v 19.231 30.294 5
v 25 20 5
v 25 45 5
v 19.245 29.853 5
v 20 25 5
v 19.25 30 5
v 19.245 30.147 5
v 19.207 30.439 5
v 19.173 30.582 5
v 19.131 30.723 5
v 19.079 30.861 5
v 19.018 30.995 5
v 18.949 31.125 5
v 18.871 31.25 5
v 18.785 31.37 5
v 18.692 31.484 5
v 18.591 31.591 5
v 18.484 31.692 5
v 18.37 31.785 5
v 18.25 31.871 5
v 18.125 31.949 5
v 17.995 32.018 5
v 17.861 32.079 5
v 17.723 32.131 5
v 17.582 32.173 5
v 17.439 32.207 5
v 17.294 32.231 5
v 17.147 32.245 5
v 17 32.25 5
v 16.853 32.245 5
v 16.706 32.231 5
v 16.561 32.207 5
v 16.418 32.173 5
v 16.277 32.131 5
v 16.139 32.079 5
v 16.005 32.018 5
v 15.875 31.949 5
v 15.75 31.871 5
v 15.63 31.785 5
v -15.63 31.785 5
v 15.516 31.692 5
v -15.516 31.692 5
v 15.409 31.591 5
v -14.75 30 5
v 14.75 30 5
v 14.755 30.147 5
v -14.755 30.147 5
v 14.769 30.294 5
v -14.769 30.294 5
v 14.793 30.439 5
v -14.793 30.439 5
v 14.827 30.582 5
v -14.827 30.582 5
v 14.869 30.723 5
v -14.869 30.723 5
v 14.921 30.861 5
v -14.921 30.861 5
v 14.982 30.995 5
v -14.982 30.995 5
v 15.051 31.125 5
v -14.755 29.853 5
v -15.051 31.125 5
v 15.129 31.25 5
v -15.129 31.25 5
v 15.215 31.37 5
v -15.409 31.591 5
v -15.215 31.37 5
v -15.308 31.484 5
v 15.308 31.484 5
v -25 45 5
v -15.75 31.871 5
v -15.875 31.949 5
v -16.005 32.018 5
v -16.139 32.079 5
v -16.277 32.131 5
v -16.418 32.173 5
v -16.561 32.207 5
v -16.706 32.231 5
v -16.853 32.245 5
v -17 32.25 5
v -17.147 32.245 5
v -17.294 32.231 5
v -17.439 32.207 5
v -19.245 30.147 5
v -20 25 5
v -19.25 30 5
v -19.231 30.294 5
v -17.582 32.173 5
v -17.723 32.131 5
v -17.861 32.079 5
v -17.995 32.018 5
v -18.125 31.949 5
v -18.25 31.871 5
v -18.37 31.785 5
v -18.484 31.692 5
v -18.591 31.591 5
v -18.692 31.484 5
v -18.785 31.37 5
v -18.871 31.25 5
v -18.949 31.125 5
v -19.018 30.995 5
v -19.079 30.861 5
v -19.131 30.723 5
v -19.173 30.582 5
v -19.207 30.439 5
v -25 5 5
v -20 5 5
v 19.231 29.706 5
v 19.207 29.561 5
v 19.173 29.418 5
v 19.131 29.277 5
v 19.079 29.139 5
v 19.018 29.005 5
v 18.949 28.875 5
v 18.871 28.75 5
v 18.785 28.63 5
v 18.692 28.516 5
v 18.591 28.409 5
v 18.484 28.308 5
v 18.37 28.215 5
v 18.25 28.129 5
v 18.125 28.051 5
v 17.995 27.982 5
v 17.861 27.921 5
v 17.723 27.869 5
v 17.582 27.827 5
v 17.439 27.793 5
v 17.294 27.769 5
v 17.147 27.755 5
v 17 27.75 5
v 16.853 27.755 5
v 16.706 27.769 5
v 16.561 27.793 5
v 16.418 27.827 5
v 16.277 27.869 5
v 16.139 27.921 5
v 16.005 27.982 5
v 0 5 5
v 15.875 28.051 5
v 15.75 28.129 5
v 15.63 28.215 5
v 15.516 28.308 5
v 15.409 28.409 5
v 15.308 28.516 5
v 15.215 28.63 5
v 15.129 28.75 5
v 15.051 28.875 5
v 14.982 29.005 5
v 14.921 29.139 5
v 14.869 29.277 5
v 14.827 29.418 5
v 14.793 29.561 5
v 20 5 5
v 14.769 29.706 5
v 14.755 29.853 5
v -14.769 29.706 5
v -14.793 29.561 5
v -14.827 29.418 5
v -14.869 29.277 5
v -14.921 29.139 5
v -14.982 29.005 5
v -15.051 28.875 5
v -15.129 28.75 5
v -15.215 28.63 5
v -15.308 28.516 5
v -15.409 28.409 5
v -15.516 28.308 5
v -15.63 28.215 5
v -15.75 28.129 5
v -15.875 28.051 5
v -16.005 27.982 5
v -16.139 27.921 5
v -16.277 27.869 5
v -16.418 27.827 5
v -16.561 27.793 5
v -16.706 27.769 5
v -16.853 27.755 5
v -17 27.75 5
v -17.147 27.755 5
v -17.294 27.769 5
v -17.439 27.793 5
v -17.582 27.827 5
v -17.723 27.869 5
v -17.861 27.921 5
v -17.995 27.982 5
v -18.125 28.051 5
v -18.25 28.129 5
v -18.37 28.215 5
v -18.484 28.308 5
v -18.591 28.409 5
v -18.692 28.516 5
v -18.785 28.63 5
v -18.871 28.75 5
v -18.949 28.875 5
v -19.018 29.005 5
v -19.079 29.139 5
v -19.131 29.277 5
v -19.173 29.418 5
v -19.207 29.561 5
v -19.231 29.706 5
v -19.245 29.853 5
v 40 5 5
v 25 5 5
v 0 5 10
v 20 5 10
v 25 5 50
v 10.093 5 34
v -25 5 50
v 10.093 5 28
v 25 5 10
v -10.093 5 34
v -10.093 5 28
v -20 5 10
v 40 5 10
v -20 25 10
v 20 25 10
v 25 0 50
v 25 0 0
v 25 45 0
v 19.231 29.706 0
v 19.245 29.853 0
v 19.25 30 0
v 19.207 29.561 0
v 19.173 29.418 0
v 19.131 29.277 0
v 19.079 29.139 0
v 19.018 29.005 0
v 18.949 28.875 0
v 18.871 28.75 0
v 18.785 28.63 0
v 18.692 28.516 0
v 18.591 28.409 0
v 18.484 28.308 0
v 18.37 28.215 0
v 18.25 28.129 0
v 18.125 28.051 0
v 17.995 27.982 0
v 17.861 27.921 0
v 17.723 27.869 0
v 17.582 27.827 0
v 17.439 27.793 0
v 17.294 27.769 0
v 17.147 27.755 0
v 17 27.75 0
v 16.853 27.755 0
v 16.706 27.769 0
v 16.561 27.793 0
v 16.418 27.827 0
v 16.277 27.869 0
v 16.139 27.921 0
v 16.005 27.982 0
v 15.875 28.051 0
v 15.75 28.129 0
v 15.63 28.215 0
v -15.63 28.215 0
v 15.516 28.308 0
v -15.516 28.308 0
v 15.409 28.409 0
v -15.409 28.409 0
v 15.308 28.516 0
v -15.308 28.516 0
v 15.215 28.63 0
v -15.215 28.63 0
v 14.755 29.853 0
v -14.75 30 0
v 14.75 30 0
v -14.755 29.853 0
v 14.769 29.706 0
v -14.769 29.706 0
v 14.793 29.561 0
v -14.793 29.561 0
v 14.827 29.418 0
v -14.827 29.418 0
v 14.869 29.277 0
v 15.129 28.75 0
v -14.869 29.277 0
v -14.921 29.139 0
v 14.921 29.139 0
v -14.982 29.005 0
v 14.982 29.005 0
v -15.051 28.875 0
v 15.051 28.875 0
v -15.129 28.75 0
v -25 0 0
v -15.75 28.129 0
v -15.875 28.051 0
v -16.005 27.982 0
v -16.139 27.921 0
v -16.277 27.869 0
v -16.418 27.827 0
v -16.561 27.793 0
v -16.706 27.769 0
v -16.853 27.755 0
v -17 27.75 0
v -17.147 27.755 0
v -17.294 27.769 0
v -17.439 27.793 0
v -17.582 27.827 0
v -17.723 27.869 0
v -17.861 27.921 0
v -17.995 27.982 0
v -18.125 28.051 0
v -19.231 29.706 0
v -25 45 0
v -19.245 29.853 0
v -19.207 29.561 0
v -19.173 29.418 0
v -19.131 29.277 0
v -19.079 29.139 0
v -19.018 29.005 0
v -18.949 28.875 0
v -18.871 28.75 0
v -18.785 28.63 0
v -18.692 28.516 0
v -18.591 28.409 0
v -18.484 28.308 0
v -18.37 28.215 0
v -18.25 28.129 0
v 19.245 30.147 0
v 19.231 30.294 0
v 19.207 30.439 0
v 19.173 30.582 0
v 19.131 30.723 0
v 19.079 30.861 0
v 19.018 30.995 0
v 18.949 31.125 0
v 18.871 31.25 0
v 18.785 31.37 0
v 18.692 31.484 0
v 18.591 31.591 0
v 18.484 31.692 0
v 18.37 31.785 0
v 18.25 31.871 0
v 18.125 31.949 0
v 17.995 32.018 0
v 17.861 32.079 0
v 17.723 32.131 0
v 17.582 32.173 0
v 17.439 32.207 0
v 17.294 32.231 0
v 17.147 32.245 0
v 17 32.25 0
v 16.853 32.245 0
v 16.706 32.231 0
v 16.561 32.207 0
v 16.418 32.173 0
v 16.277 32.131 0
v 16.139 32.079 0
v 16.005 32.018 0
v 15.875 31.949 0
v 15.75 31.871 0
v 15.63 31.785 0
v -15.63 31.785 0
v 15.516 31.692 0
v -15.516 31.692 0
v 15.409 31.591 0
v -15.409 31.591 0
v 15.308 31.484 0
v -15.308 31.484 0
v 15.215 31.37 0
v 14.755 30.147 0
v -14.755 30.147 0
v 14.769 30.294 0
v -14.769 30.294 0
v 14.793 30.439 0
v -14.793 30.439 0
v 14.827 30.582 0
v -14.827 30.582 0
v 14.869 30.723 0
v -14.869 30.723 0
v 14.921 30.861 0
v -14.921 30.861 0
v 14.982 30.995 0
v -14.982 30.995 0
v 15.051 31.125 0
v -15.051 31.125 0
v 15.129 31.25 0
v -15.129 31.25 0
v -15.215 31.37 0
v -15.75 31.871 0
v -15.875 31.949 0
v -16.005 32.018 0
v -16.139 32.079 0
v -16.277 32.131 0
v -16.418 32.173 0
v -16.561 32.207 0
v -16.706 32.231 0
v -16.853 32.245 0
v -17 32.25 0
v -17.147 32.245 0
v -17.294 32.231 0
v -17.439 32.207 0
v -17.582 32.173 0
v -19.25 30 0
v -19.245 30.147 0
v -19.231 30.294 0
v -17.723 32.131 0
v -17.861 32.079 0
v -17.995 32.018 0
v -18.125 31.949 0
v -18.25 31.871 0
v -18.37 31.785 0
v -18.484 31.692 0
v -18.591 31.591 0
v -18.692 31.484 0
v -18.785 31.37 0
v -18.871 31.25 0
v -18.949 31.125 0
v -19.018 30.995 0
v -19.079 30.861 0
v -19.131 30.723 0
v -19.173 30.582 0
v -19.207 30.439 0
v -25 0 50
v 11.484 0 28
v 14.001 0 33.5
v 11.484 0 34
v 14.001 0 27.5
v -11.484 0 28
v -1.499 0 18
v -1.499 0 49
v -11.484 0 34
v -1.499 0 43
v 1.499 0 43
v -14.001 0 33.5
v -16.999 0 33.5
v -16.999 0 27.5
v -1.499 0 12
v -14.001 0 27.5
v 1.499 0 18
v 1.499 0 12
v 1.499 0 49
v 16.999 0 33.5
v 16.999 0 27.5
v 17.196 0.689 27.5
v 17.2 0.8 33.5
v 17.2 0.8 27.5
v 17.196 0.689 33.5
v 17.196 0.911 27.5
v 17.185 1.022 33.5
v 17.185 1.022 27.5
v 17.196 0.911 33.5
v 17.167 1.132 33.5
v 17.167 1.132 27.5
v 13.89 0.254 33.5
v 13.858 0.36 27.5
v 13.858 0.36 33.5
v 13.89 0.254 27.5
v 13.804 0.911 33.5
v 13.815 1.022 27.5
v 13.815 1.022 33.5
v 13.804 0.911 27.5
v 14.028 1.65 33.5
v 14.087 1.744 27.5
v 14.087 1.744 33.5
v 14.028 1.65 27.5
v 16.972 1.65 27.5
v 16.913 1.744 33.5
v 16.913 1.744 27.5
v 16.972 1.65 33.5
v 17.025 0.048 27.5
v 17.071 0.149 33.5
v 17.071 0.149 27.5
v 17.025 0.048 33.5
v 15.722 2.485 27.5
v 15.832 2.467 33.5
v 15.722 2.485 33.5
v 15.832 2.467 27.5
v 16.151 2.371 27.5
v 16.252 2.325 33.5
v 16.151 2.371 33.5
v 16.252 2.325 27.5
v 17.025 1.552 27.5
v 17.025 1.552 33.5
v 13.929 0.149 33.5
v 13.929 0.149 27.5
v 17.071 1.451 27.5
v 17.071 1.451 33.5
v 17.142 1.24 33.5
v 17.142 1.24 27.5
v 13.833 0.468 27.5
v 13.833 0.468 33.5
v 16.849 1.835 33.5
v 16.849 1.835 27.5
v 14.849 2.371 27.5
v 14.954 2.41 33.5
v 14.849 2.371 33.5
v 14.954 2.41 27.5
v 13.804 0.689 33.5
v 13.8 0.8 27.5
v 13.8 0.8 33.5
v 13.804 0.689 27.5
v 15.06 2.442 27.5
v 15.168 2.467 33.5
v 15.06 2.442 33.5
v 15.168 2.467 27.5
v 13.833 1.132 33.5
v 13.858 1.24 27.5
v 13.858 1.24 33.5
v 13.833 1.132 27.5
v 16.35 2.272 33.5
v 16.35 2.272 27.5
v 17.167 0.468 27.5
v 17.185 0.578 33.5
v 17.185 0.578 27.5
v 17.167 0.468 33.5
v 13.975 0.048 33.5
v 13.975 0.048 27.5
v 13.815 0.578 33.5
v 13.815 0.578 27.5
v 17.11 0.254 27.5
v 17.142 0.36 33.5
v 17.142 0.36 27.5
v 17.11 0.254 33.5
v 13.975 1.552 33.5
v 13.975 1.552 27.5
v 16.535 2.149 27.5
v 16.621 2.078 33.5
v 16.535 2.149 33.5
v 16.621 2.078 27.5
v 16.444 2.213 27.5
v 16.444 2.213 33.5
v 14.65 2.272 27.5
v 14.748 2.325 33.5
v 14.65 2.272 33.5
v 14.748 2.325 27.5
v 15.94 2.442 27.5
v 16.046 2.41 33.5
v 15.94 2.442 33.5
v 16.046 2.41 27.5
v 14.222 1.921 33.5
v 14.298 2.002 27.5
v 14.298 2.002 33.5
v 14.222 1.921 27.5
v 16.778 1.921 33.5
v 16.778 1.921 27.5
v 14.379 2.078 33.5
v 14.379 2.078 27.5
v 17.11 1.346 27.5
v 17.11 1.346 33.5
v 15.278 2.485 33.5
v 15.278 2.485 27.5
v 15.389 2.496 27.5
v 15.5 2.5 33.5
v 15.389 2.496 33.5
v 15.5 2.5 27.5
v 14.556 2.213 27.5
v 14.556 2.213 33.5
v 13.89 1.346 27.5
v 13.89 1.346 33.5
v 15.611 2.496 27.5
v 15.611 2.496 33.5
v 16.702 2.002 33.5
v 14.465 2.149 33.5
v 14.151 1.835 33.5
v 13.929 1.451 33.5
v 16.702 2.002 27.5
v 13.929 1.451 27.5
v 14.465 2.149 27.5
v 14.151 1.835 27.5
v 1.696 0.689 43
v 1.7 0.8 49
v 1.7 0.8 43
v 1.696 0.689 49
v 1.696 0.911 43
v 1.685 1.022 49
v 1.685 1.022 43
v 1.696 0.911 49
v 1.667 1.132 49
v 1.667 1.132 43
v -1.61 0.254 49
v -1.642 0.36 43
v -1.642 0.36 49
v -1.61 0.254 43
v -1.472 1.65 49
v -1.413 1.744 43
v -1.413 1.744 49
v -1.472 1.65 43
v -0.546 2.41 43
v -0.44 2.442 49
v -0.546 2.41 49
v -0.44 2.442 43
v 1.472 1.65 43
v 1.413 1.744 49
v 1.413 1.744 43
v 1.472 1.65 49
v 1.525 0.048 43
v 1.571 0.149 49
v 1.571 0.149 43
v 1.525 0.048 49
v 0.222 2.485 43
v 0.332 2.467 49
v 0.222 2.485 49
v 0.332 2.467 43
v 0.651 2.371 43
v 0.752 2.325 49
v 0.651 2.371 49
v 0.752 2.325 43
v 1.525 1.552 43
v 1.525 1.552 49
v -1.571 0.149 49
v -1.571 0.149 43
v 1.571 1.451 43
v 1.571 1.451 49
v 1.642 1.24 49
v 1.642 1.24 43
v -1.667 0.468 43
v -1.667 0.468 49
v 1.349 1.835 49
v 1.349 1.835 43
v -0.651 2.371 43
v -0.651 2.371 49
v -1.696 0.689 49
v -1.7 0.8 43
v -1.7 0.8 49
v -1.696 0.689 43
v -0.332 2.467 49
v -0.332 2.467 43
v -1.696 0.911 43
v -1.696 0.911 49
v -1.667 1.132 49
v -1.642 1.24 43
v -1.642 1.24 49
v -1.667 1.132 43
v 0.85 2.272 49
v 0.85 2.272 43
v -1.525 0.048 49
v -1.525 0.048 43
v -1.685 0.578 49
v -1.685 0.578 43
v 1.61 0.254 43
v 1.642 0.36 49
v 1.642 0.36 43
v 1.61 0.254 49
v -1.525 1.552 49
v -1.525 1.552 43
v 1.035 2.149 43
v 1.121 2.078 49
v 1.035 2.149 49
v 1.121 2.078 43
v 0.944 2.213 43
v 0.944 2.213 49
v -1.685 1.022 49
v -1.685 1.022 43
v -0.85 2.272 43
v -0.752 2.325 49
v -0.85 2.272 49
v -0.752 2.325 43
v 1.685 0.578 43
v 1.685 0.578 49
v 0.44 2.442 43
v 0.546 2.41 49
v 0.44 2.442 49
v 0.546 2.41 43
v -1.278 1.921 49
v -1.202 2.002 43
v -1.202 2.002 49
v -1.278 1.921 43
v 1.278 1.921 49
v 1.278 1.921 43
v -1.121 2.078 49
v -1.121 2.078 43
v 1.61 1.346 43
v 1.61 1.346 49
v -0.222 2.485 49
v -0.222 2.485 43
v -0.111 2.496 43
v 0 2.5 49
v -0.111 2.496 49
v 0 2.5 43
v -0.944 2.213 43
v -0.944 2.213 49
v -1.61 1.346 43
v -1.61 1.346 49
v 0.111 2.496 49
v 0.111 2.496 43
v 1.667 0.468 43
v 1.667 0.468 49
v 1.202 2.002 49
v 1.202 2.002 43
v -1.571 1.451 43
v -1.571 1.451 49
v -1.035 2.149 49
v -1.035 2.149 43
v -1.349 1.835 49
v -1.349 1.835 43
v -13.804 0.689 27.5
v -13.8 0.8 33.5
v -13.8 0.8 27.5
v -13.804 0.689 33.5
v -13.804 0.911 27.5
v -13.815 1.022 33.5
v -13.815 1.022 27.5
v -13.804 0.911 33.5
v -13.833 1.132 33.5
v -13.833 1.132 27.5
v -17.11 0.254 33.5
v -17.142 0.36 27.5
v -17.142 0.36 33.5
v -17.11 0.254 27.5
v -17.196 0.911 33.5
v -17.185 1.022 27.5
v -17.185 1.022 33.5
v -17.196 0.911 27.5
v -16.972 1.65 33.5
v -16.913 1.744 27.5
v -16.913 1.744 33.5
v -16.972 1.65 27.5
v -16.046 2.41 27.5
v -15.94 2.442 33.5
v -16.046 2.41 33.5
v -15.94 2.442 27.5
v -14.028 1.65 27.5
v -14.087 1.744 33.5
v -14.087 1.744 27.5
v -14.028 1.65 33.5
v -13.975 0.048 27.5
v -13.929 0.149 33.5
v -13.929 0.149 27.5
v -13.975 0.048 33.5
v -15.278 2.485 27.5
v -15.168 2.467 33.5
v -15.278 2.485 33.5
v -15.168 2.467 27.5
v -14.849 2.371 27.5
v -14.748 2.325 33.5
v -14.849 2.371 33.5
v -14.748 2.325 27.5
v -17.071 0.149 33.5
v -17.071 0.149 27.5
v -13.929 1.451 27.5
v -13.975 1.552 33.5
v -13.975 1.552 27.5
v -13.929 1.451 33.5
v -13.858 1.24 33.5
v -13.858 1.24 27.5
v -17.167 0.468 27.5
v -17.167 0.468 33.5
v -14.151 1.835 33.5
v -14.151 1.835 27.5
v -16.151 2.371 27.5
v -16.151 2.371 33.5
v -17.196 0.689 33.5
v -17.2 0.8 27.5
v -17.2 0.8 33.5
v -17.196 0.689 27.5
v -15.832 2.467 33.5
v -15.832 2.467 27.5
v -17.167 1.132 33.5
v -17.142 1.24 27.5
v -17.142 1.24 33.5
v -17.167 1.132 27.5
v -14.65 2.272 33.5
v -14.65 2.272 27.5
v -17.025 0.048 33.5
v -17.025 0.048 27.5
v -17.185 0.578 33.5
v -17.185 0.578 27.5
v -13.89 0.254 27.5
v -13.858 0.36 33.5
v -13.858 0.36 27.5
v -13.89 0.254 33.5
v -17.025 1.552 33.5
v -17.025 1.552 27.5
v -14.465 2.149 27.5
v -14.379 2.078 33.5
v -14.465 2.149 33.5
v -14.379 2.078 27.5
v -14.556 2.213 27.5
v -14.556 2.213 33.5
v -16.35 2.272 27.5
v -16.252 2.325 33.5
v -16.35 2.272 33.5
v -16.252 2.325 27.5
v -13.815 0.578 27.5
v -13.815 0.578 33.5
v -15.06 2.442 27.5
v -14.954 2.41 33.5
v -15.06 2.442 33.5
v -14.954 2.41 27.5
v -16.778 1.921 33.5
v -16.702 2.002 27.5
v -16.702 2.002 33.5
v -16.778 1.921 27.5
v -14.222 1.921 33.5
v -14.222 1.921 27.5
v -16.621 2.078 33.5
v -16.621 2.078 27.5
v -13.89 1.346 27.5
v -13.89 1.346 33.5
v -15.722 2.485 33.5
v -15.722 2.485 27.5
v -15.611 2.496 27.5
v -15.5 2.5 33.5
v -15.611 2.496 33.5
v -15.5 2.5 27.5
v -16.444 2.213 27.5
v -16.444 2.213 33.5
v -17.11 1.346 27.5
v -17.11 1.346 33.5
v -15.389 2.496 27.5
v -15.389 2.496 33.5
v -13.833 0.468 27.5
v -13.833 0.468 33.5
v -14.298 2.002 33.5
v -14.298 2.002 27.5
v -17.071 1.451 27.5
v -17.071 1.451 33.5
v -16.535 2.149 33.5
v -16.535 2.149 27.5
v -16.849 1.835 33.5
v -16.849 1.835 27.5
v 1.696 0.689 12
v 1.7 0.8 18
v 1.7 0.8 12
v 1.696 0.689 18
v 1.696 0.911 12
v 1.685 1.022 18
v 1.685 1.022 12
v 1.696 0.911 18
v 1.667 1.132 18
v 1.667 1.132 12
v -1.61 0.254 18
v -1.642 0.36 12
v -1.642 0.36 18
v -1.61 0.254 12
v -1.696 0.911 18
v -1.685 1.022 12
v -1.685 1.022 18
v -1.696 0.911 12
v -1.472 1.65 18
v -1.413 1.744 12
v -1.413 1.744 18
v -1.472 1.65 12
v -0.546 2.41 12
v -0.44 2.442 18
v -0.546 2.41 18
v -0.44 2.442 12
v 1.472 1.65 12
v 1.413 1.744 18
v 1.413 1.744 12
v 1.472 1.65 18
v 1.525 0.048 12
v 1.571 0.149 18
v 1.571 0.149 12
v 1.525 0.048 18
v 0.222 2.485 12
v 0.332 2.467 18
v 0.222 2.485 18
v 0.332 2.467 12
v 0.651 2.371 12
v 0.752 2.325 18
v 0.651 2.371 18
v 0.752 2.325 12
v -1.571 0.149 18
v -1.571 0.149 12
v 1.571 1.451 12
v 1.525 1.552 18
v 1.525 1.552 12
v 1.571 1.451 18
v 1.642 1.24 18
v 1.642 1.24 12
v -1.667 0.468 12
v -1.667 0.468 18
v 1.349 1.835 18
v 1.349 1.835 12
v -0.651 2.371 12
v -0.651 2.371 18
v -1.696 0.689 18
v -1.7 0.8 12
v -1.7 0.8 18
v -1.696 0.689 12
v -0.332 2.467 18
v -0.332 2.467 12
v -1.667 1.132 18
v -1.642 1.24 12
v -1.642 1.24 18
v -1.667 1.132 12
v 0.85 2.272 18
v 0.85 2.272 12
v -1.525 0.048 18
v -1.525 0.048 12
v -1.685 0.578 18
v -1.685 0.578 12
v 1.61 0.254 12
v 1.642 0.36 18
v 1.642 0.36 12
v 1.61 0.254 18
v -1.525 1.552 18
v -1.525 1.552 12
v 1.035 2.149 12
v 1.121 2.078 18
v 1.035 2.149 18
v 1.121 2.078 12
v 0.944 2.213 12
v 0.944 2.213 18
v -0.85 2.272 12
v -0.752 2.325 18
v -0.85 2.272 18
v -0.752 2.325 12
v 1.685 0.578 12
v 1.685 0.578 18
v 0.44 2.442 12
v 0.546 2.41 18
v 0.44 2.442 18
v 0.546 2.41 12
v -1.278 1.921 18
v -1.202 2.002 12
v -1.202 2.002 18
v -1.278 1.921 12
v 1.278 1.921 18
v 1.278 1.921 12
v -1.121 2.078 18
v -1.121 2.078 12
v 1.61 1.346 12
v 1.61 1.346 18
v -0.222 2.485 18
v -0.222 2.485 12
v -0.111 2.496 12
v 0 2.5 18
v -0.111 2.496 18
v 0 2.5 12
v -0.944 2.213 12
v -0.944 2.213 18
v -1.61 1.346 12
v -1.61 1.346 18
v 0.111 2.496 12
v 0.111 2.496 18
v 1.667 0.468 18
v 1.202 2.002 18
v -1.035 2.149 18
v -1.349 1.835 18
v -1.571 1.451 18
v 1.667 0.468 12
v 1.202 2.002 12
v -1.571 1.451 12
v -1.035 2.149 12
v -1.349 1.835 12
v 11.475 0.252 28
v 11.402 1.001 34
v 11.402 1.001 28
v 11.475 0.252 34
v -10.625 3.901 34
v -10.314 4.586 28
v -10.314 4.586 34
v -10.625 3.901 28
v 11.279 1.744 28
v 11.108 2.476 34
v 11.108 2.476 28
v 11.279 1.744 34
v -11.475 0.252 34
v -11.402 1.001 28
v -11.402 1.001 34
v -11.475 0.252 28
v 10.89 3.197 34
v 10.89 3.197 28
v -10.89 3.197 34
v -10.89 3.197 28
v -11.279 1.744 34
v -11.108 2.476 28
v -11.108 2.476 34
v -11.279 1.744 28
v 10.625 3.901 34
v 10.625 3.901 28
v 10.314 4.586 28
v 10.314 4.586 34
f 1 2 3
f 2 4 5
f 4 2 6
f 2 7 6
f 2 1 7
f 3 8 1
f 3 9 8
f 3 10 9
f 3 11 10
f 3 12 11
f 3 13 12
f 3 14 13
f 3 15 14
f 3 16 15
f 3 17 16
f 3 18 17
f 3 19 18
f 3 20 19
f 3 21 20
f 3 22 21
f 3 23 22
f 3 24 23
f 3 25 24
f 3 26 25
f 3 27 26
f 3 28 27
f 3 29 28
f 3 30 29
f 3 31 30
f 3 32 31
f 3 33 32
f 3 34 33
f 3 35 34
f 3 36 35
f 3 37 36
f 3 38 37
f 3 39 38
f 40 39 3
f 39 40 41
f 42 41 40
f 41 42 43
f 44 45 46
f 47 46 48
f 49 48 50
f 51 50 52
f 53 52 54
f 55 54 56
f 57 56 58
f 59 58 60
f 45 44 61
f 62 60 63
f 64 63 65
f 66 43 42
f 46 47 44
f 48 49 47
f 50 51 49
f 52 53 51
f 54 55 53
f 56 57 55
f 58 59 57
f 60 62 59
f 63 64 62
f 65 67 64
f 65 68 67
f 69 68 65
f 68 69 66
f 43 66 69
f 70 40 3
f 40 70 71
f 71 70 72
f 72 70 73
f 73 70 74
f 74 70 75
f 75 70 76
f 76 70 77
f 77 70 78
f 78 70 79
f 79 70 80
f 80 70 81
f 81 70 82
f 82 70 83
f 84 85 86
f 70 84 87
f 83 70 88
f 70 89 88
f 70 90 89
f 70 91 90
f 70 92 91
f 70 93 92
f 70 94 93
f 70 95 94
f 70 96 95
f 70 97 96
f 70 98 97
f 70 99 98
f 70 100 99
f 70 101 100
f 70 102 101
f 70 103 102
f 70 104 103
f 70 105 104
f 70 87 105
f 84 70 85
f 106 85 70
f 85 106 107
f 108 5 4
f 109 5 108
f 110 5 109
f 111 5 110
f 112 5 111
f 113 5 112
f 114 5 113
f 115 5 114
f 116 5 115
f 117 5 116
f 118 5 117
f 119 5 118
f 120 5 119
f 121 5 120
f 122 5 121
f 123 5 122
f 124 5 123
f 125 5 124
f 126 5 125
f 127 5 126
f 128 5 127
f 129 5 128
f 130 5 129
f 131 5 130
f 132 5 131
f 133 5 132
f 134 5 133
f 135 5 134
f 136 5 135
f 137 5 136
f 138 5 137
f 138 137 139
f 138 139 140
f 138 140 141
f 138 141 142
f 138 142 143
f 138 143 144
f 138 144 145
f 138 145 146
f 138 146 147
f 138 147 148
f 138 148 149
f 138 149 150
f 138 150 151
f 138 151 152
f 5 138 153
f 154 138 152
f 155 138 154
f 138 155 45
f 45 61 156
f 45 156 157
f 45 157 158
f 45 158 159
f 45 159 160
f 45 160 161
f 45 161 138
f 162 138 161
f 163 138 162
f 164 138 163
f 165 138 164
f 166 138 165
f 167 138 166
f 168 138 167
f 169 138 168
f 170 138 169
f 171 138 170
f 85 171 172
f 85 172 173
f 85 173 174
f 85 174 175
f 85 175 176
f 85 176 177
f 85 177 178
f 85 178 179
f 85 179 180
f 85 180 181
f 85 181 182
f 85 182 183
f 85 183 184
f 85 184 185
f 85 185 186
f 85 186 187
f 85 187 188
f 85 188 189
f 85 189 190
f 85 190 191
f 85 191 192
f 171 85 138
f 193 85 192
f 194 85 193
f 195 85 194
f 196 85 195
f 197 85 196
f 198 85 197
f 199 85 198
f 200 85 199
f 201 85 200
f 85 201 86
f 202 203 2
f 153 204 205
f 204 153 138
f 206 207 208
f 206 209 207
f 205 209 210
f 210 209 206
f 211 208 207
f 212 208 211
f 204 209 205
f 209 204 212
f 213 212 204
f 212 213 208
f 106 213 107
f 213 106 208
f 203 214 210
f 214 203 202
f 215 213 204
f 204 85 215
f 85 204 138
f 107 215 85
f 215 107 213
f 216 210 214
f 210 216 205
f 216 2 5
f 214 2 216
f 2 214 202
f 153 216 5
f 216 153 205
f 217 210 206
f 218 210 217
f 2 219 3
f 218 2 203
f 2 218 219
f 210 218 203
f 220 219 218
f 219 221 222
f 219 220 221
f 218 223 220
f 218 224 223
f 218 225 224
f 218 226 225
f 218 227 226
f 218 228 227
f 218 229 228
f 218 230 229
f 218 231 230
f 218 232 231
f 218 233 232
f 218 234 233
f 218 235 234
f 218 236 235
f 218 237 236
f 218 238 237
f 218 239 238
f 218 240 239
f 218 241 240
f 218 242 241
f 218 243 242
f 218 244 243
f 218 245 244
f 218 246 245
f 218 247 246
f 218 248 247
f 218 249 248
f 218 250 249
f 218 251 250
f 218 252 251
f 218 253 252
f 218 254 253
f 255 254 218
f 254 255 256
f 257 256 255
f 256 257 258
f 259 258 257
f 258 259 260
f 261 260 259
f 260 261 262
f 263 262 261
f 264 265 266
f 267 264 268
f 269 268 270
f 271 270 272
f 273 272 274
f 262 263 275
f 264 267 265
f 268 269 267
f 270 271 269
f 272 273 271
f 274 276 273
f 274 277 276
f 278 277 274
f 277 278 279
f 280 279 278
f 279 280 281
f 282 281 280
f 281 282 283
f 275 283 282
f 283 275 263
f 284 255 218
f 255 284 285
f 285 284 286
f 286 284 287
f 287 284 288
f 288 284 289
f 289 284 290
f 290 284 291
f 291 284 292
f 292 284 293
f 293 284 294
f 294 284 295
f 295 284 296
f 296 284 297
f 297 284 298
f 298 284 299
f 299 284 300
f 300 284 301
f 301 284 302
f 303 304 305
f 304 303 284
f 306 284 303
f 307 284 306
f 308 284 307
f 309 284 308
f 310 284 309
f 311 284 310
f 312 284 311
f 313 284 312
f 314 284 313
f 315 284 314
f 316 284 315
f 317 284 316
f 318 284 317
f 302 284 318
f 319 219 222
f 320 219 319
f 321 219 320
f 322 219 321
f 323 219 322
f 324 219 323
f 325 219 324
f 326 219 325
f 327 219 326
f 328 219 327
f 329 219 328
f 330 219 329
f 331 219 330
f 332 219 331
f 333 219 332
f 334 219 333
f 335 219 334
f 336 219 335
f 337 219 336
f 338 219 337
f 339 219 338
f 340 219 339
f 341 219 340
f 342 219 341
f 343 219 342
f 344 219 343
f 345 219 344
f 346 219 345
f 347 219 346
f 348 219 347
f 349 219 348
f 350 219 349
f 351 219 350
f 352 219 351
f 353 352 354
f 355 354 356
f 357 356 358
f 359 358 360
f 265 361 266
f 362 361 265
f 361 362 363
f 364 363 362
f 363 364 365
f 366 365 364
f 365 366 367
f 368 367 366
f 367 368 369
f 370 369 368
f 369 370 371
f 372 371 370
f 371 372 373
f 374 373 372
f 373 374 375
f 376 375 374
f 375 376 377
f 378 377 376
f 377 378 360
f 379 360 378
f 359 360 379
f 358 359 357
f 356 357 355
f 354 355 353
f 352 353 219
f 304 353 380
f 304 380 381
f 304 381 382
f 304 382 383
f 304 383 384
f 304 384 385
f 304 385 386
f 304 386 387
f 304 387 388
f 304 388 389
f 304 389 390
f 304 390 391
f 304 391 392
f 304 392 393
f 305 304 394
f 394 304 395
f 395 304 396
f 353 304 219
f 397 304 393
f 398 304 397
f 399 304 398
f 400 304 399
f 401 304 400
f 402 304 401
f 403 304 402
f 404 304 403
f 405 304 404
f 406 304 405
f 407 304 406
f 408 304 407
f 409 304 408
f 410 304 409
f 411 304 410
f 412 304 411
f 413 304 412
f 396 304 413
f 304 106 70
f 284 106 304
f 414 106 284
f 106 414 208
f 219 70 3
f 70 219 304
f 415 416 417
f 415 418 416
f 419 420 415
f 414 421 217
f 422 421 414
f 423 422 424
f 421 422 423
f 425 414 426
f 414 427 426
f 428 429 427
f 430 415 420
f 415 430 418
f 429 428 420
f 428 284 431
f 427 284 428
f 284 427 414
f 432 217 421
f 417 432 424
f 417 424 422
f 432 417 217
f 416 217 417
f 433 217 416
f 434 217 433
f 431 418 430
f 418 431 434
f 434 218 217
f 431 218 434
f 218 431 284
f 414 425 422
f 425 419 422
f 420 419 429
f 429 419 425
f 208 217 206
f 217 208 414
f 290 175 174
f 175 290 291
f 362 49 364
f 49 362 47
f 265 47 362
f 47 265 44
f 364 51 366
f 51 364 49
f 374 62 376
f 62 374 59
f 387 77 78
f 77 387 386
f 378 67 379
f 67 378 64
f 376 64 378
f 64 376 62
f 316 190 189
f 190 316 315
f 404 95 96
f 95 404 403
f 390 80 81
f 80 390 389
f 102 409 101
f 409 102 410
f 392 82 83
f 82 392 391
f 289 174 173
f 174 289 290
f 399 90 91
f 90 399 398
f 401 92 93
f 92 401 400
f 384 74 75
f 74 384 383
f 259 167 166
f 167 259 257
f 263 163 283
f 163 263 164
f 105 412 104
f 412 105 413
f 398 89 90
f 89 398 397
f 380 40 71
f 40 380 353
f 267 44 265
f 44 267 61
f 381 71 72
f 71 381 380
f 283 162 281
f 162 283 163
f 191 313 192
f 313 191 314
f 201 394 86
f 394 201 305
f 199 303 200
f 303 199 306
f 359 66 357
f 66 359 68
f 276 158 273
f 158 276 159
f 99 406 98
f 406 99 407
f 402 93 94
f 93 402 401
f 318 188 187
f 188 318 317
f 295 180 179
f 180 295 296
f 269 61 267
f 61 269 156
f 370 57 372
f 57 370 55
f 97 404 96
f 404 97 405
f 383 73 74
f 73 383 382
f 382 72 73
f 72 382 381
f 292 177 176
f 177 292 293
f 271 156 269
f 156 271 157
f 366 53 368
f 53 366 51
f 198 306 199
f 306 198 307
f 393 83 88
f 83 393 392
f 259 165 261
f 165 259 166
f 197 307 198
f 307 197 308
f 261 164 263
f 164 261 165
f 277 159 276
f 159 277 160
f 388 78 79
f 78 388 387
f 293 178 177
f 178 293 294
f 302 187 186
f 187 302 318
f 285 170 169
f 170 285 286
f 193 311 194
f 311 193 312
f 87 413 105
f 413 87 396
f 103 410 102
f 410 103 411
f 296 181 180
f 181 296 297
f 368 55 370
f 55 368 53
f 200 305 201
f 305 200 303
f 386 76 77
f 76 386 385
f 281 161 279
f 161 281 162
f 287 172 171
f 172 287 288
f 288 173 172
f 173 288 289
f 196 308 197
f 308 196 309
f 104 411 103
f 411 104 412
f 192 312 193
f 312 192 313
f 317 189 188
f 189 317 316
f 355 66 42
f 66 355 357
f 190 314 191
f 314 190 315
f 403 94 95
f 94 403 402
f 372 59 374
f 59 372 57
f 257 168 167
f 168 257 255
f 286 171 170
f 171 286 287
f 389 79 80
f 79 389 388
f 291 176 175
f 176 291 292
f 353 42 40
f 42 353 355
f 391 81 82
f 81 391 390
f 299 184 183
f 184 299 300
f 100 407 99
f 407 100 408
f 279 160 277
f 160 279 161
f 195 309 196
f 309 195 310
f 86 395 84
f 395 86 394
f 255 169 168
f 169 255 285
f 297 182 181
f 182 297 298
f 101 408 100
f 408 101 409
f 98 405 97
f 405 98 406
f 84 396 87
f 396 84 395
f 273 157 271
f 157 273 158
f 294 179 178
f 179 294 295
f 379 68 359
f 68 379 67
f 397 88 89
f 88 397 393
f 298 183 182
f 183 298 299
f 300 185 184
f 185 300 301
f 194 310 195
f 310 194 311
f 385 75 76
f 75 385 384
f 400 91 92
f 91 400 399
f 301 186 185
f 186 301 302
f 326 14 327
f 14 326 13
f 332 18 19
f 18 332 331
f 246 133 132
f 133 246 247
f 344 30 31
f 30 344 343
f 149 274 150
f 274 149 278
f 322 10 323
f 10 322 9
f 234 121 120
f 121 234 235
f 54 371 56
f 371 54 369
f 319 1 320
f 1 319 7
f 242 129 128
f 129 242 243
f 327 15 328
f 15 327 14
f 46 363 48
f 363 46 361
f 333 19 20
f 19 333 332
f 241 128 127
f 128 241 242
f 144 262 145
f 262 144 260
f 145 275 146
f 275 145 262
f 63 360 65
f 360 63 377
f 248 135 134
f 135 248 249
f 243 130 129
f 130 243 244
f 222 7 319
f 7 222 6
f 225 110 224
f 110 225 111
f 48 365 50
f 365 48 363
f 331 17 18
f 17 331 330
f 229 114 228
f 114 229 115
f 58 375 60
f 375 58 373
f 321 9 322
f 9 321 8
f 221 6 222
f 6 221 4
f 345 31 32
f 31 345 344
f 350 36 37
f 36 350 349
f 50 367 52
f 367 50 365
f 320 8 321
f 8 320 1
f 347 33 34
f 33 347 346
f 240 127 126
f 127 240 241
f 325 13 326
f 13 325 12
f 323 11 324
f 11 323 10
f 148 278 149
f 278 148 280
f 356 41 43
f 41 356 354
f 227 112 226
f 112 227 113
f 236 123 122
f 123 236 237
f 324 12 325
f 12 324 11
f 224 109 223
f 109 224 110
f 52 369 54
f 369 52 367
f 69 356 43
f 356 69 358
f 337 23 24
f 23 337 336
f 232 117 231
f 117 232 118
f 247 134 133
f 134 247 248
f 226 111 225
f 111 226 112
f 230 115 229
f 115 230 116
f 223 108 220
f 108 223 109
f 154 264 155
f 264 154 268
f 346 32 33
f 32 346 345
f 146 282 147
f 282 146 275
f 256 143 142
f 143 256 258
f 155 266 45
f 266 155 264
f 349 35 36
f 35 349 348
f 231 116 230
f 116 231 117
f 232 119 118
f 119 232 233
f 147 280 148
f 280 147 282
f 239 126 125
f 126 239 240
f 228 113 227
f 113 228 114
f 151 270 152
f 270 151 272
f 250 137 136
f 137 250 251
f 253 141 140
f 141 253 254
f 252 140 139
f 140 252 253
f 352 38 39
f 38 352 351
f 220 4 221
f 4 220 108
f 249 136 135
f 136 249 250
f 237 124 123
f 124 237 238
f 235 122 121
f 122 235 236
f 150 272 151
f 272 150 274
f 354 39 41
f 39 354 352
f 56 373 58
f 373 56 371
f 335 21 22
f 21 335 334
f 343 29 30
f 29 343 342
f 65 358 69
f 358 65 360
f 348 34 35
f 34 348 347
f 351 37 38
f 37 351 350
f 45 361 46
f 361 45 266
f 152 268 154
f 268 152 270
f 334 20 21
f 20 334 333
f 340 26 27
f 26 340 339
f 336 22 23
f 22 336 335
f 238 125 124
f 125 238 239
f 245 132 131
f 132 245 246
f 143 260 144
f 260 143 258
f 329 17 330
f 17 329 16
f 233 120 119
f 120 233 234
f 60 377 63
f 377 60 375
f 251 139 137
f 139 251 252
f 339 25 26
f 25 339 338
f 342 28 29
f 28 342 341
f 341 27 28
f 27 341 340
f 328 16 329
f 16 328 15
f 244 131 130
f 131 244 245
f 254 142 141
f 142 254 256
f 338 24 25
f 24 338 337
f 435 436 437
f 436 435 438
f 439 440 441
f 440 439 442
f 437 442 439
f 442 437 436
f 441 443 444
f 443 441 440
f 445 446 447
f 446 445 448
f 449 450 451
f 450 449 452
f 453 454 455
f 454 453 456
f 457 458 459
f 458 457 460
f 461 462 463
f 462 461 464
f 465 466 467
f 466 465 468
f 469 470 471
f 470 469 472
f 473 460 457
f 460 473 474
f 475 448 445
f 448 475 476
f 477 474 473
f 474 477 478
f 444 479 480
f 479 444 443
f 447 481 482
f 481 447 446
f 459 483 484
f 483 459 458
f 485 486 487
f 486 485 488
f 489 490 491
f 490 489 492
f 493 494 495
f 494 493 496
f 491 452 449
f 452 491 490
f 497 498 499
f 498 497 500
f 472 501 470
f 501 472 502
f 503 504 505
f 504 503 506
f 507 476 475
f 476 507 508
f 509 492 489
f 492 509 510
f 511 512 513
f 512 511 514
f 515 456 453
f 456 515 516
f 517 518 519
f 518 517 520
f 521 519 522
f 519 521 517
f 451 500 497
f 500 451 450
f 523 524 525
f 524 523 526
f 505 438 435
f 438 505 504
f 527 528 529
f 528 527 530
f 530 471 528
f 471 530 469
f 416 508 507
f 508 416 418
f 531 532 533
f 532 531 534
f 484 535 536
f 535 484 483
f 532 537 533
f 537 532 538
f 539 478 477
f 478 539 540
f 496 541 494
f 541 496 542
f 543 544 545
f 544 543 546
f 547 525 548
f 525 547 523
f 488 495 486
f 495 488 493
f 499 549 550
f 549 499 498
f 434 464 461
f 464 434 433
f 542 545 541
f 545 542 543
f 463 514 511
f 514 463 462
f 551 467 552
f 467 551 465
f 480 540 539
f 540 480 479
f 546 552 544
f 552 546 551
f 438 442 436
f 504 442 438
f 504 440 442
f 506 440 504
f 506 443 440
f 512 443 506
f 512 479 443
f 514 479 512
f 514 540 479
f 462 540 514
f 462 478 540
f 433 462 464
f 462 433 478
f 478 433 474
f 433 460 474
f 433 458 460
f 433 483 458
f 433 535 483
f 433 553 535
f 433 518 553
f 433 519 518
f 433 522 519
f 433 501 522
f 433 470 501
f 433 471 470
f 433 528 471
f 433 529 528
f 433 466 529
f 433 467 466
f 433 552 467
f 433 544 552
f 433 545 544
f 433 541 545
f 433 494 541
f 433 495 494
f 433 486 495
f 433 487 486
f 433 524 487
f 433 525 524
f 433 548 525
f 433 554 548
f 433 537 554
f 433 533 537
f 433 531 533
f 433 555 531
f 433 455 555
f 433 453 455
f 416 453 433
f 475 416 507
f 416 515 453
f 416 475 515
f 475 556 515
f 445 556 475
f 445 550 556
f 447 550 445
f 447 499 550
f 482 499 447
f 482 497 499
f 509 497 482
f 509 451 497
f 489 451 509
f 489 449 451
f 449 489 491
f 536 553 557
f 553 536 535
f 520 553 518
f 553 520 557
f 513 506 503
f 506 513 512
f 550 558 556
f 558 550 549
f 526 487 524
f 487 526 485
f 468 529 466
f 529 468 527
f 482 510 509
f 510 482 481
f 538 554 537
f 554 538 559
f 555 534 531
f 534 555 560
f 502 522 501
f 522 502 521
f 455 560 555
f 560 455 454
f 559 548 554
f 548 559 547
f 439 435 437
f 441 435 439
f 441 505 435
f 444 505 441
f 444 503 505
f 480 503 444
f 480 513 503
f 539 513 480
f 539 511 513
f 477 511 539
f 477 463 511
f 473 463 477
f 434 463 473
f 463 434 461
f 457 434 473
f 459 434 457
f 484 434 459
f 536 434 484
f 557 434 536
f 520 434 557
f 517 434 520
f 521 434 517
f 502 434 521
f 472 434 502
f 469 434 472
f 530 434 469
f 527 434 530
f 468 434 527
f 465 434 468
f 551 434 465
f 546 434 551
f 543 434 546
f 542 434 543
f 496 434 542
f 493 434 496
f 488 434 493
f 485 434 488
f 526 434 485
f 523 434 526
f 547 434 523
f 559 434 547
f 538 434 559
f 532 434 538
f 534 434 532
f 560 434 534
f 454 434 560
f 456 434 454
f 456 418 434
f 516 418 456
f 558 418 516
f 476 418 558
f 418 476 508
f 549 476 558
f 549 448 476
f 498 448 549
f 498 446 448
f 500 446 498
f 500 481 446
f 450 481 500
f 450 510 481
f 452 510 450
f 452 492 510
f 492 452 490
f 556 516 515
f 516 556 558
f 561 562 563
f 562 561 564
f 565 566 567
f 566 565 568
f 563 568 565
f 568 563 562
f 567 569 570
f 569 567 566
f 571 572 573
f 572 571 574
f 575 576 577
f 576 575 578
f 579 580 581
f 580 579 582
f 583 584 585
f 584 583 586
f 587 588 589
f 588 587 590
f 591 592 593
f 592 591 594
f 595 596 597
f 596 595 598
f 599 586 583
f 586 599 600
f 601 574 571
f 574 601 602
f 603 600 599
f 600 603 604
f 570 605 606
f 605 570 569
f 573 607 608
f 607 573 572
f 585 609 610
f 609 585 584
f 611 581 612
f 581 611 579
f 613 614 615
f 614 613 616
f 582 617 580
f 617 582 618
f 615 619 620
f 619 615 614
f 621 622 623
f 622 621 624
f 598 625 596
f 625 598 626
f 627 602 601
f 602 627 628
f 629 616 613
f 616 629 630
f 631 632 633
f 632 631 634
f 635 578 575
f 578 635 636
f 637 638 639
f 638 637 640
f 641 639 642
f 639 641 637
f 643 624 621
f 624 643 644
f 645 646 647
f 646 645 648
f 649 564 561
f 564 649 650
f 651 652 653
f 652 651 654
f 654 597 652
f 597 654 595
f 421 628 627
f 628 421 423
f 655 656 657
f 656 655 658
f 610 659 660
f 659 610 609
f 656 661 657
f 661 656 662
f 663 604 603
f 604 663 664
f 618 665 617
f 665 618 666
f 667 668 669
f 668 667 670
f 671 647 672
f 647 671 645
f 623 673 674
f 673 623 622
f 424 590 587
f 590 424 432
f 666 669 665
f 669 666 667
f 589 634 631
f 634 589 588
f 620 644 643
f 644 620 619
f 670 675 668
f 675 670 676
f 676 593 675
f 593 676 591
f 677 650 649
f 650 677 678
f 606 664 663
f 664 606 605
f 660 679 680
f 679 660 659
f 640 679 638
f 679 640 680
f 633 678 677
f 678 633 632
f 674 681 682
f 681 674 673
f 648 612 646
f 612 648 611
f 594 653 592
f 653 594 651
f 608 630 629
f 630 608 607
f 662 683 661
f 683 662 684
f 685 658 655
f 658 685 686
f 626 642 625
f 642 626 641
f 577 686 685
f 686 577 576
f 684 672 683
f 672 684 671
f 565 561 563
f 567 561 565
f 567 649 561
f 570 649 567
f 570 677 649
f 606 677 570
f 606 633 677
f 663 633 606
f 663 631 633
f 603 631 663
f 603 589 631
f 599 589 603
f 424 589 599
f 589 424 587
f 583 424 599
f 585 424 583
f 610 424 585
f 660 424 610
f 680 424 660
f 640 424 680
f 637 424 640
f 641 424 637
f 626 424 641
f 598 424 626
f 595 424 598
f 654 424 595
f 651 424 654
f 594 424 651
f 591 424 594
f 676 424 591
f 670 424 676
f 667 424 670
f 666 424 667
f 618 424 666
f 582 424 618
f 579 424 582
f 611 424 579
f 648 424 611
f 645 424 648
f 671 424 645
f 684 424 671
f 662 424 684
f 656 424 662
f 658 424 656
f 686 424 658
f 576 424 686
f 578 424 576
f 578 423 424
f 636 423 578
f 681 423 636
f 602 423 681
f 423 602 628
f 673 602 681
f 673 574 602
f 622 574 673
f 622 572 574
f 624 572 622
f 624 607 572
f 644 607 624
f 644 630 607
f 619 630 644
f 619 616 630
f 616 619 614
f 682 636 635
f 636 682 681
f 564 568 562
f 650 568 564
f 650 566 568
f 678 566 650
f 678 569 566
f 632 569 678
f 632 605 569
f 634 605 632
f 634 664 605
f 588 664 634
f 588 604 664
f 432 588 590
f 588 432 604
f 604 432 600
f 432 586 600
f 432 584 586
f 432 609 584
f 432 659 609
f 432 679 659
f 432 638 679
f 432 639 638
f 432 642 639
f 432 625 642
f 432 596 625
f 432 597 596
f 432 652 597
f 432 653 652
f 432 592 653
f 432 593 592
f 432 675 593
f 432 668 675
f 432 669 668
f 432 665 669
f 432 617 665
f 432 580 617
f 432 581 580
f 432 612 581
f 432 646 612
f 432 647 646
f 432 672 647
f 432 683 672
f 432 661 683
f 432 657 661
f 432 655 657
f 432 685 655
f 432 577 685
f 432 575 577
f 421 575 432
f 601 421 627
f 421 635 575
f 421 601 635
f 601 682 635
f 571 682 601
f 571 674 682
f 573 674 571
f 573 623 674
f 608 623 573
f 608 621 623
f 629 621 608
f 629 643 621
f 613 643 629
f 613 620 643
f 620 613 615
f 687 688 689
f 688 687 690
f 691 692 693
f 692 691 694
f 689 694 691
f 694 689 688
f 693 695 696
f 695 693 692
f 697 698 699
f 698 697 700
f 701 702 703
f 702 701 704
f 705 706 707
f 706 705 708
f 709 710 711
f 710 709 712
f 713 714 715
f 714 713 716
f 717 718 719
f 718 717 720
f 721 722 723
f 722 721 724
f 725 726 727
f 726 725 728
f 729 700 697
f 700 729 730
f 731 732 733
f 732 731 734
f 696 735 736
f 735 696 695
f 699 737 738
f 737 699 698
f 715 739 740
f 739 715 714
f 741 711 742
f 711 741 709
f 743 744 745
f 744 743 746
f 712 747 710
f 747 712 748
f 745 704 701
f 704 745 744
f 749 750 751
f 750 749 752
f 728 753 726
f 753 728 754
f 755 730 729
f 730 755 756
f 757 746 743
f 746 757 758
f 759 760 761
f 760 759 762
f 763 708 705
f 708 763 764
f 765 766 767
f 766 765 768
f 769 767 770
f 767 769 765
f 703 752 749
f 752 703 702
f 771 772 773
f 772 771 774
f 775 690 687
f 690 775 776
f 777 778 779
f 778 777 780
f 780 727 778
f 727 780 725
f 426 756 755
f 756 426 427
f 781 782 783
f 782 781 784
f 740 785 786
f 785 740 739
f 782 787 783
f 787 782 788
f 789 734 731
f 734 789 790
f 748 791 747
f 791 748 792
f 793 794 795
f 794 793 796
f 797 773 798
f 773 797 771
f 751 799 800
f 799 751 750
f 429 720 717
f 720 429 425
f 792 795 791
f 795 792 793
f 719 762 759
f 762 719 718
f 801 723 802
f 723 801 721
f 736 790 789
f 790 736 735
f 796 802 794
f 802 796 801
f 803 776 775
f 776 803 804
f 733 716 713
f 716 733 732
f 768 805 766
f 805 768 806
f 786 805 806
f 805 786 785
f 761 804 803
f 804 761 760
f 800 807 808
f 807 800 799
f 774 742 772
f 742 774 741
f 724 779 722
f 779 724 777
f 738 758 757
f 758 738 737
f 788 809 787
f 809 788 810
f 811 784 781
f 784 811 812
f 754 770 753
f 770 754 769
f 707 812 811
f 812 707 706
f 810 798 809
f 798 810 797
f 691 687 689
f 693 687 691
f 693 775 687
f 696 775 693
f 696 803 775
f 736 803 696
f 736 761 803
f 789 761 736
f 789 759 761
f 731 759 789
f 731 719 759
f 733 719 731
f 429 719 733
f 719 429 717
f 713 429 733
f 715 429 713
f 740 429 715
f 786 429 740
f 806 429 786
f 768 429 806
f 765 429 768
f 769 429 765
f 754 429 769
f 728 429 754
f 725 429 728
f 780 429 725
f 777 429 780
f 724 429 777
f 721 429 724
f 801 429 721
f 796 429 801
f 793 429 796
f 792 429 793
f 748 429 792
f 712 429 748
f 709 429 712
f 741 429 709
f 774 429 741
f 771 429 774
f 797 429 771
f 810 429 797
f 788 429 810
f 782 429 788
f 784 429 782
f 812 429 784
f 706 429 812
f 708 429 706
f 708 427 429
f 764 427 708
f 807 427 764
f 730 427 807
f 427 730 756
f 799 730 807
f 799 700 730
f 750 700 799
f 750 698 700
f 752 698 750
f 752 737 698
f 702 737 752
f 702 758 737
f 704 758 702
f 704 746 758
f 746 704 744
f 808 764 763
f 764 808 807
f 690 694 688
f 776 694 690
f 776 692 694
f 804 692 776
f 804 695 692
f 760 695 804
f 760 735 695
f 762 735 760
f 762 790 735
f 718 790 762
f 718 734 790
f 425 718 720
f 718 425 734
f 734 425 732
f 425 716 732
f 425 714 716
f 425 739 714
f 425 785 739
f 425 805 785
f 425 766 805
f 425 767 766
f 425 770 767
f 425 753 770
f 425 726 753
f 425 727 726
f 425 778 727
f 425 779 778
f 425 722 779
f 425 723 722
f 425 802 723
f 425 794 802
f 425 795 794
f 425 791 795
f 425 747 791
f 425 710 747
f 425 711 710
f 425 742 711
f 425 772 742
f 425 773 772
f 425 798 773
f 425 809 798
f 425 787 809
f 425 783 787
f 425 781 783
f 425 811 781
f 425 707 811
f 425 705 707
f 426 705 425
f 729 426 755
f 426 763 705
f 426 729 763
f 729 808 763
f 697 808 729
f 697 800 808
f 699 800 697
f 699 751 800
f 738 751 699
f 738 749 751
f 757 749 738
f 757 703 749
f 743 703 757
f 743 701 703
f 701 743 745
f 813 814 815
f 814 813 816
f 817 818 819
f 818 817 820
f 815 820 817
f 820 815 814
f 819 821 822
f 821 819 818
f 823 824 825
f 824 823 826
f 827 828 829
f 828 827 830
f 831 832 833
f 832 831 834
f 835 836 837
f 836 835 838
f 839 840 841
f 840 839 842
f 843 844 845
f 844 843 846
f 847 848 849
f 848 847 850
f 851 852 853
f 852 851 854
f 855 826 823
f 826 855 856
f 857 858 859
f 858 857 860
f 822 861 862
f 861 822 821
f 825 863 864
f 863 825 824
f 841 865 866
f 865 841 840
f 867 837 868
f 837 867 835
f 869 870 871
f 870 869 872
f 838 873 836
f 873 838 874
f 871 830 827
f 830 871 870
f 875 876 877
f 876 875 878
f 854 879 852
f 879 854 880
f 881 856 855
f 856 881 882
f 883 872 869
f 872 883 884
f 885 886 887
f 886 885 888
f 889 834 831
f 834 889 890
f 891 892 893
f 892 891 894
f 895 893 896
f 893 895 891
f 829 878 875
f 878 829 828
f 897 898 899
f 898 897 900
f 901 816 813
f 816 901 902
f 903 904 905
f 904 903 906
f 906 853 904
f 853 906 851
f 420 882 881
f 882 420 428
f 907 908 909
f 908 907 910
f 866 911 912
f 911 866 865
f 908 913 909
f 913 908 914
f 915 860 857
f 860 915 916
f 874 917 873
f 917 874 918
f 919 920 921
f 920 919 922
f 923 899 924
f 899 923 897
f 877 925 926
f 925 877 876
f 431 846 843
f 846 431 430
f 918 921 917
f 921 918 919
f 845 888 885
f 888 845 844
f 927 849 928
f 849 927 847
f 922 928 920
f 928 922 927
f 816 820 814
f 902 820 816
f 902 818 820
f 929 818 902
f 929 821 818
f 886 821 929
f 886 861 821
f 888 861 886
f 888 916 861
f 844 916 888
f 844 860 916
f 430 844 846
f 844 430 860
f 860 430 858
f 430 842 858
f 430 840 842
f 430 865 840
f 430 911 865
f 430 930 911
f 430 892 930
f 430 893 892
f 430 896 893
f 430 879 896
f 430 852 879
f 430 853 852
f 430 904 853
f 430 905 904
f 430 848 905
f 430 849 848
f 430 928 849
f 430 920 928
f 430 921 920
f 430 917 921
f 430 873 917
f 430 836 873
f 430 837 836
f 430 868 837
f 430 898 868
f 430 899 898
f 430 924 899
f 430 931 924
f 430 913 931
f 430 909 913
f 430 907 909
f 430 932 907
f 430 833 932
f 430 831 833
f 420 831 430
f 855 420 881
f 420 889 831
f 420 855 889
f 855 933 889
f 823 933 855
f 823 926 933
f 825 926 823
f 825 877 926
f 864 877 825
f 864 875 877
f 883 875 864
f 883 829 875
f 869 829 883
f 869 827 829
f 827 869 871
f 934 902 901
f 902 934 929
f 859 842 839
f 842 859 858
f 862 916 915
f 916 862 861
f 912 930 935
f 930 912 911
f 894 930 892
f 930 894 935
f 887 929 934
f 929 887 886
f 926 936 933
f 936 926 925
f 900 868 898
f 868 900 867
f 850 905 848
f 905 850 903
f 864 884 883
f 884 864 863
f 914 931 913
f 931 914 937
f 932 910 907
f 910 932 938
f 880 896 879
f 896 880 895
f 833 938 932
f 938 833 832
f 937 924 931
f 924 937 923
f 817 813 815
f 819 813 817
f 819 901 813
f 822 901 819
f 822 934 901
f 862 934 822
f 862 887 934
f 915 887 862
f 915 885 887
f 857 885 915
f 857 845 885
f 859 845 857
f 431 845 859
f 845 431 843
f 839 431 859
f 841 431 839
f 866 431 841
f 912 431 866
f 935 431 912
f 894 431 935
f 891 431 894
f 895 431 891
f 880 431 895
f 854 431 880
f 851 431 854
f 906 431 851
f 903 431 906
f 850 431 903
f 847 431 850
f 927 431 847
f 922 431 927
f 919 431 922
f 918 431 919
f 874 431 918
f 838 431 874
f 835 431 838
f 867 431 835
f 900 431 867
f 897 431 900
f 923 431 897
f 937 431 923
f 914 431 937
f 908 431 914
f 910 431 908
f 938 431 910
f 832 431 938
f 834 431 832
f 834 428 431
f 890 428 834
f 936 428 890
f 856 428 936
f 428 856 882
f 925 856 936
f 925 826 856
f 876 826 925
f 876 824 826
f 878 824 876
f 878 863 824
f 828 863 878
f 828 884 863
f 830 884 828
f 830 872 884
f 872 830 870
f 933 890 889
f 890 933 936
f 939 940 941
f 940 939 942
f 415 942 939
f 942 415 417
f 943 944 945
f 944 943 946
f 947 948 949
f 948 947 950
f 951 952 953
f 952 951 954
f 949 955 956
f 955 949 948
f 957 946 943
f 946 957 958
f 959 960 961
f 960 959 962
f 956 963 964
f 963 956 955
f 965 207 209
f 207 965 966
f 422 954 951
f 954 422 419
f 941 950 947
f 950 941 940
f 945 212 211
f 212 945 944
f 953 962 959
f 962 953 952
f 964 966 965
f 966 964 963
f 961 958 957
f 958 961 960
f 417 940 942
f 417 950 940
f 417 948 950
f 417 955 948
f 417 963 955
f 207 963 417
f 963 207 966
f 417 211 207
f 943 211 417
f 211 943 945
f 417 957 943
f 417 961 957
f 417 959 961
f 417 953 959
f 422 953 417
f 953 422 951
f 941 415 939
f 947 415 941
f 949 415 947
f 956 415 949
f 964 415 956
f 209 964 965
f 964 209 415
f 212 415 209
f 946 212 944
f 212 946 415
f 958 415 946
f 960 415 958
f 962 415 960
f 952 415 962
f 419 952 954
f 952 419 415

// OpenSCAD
// L-shaped mounting bracket for NEMA 17 stepper motor (e.g. syringe pump)
// Print orientation: base plate on bed, vertical plate builds upward (+Z)

// ---------------- Parameters ----------------
base_x      = 25;    // base plate half-length in X (x = -25 .. 25)
base_y      = 45;    // base plate length in Y (y = 0 .. 45)
base_z      = 5;     // base plate thickness in Z

motor_h     = 50;    // vertical motor plate height in Z (z = 0 .. 50)
motor_t     = 5;     // vertical motor plate thickness in Y (y = 0 .. 5)

boss_d      = 23;    // motor centring boss hole diameter
boss_x      = 0;     // boss hole centre X
boss_z      = 28;    // boss hole centre Z

screw_d     = 3.4;   // M3 screw hole diameter
screw_n     = 4;     // number of screw holes
screw_a     = 31;    // square pattern side length (centre to centre)

gusset_t    = 5;     // gusset thickness in X
gusset_y    = 20;    // gusset leg along +Y
gusset_z    = 20;    // gusset leg along +Z

eps         = 0.5;   // cutter overshoot past faces
$fn         = 96;    // curve resolution

// ---------------- Model ----------------
difference() {
    union() {
        // Base plate
        translate([-base_x, 0, 0])
            cube([2 * base_x, base_y, base_z]);

        // Vertical motor plate
        translate([-base_x, 0, 0])
            cube([2 * base_x, motor_t, motor_h]);

        // Gussets: right-angle corner at y = 5, z = 5
        for (sx = [-1, 1])
            translate([sx * (base_x - gusset_t), 5, 5])
                linear_extrude(height = gusset_t)
                    polygon([[0, 0], [gusset_y, 0], [0, gusset_z]]);
    }

    // Base plate through-holes (M4) at x = -17, 17; y = 30
    for (x = [-17, 17])
        translate([x, 30, -eps])
            cylinder(d = 4.5, h = base_z + 2 * eps);

    // Motor plate boss hole (along Y), centre x = 0, z = 28
    translate([boss_x, -eps, boss_z])
        cylinder(d = boss_d, h = motor_t + 2 * eps);

    // M3 screw holes on 31 mm square pattern, centred on boss hole
    for (i = [0 : screw_n - 1]) {
        angle = i * 90;
        translate([
            boss_x + screw_a / 2 * cos(angle),
            motor_t / 2 - screw_d / 2,
            boss_z + screw_a / 2 * sin(angle)
        ])
            translate([0, 0, -eps])
                cylinder(d = screw_d, h = motor_t + 2 * eps);
    }
}
